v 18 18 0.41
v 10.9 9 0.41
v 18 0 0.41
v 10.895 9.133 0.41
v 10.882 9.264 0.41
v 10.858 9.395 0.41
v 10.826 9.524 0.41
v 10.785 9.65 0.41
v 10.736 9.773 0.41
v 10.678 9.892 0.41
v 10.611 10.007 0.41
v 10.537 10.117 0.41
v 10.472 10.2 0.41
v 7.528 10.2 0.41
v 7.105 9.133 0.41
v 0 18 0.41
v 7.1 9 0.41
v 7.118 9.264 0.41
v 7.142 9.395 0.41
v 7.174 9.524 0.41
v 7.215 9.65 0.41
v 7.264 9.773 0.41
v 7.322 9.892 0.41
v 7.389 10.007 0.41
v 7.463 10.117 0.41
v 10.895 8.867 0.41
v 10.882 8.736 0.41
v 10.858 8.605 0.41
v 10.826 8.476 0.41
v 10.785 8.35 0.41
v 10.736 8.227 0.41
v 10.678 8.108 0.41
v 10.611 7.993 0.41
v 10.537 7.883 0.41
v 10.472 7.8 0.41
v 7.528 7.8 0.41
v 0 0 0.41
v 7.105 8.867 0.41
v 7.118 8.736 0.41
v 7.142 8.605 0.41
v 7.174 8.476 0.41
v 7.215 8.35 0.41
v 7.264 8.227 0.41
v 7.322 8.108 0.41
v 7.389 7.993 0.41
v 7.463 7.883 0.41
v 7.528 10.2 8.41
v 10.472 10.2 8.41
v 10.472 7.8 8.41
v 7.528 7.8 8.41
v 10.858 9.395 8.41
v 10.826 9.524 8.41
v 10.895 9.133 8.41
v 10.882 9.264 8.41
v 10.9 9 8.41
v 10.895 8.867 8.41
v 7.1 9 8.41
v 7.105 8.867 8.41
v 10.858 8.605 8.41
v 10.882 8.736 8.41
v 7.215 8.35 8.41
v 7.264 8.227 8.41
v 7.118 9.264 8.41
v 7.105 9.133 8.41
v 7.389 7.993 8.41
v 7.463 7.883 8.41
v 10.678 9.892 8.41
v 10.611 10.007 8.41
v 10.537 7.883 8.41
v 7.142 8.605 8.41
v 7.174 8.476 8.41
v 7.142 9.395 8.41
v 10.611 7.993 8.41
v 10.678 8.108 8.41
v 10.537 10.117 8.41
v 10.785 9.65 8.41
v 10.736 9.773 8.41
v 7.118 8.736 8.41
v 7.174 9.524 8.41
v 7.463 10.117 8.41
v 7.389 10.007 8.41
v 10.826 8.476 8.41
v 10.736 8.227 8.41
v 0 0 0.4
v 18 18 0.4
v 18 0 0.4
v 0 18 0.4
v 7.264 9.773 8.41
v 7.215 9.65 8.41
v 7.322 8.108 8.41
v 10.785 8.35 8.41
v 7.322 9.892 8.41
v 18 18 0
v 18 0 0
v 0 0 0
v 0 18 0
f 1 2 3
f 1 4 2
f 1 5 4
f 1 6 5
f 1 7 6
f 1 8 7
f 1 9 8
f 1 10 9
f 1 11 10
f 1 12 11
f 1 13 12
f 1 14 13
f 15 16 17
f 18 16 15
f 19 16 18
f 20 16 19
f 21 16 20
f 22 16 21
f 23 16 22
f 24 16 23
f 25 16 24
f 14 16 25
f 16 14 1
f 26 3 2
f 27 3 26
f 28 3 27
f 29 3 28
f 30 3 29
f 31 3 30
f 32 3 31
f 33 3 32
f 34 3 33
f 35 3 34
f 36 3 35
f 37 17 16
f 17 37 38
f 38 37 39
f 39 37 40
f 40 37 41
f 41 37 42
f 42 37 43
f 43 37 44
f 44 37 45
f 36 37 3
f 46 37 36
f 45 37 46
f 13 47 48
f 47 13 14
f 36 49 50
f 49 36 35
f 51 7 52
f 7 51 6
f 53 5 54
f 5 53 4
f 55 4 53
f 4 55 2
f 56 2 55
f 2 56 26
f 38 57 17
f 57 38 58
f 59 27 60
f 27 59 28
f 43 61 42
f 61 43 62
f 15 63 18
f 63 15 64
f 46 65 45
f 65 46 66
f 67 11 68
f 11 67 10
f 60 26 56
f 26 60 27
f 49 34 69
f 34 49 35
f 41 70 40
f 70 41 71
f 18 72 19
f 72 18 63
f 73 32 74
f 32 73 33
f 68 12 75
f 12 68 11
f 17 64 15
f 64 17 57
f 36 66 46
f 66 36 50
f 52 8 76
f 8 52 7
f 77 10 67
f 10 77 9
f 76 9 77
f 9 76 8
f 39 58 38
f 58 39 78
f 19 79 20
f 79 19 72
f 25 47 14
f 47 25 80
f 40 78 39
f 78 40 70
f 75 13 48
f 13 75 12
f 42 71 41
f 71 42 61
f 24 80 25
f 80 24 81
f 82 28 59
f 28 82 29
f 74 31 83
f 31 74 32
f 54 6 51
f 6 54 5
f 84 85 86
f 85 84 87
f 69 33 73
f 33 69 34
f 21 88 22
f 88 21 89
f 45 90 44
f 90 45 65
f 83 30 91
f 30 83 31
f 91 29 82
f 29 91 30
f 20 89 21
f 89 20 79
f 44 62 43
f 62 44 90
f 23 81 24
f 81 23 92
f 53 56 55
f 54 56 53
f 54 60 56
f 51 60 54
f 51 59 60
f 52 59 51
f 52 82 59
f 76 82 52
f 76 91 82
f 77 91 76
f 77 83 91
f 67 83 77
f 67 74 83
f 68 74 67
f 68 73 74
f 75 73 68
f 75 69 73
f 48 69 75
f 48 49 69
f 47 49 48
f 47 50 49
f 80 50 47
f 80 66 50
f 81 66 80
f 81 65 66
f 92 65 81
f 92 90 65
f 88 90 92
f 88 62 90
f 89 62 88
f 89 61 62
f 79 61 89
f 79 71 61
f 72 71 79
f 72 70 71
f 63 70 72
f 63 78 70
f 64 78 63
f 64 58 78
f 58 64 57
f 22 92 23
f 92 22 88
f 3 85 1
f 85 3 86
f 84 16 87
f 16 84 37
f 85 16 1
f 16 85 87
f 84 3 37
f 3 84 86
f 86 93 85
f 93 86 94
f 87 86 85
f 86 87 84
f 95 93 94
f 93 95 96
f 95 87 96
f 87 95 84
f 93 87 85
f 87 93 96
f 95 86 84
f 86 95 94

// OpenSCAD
// file: ../../Base/PlacementOptions.scad
// Fischertechnik Box Foundation
// Placement Options

// Alignment
NoAlign = 0;
AlignLeft = 1;
AlignBottom = 2;
AlignCenter = 3;
AlignRight = 4;
AlignTop = 5;

// Element rotation degree steps
rotations = [0, -90, -180, -270];

// Rotation
NoRotation = 0;
Rotate0 = 0;
Rotate90 = 1;
Rotate180 = 2;
Rotate270 = 3;

// Docking (seen from above)
NoDock = -1;
DockLeft = 0;
DockTop = 1;
DockRight = 2;
DockCorner = 2;
DockBottom = 3;

// Web corners
LowerLeft = 0;
UpperLeft = 1;
UpperRight = 2;
LowerRight = 3;

// Web position relative to corner
LeftOfCorner = 0;
RightOfCorner = 1;

// Rails direction
Horizontal = true;
Vertical = false;
// file: ../../Base/Boxes.scad
// Fischertechnik Box Foundation
// Pre-designed Boxes

use <Constants.scad>

include <PlacementOptions.scad>

box190Width = 190;
box190Depth = 130;
box130Width = 130;
box130Depth = 95;

// Values are from an original ec3 box
topBottomDifference = 1.5;
outerHeight = 40;
baseThickness = 1.8;
innerHeight = outerHeight - baseThickness;
stackExcess = 5.7;
radius = 3.5;
wallThickness = 1.5;
tolerance = 0.2;

boxWallThickness = wallThickness;
boxBaseThickness = baseThickness;
boxWebWidth = 3.0;

// getBoxWallThickness()
// Gets the wall thickness of a Fischertechnik Box
function getBoxWallThickness() = boxWallThickness;

// getBoxUsageHeight(height = 38.2)
// Gets the usable height of a Fischertechnik box
// height = Outer height of the box from the bottom to the upper edge.
function getBoxUsageHeight(height = outerHeight) = height - baseThickness - stackExcess;

// getBoxInnerHeight()
// Gets the inner height of a Fischertechnik box, including the stack excess
function getBoxInnerHeight() = innerHeight;

// getBoxBaseThickness()
// Gets the thickness of the Fischertechnik box base.
function getBoxBaseThickness() = boxBaseThickness;

// getBoxWebWidth()
// Gets the width of a box web
function getBoxWebWidth() = boxWebWidth;

// getBox190Space()
// Gets the usable inner space of a Box 190 as an x/y-list
function getBox190Space() = [
    box190Width - 2*getBoxWallThickness() - topBottomDifference, 
    box190Depth - 2*getBoxWallThickness() - topBottomDifference ];

// RoundedCornerPlate(width, depth, height, radius)
// Creates a body plate with rounded corners for a box. Used
// also to create the complete box with the hull module.
// width = Width of the plate
// depth = depth of the plate 
// height = thickness of the plate
// radius = radius of the rounded corner
module RoundedCornerPlate(width, depth, height, radius) {
    translate([radius, radius])
    hull() {
        w = width-2*radius;
        d = depth-2*radius;
        cube([w, d, height]);
        cylinder(height, r=radius, $fn=getFragments());
        translate([w, 0])
            cylinder(height, r=radius, $fn=getFragments());
        translate([w, d])
            cylinder(height, r=radius, $fn=getFragments());
        translate([0, d])
            cylinder(height, r=radius, $fn=getFragments());
    }
}

// BoxBase(width, depth)
// Creates an empty stackable Fischertechnik compatible box
// width = Outer width of the box (190, 130, ...)
// depth = Outer depth of the box (130, 95, ...)

module BoxBase(width, depth, height=outerHeight) {    
    thinPlate = 0.01;

    innerHeight = height - baseThickness;    
    
    module Body(tolerance=tolerance) {
        hull() {
            // Bottom with tolerance to fit into the original boxes when stacked
            translate([-wallThickness+tolerance, -wallThickness+tolerance, -baseThickness])
                RoundedCornerPlate(width-topBottomDifference-2*tolerance, depth-topBottomDifference-2*tolerance, thinPlate, radius);
            
            // Top
            translate([-wallThickness-topBottomDifference/2, -wallThickness-topBottomDifference/2, innerHeight-thinPlate])
                RoundedCornerPlate(width, depth, thinPlate, radius);
         }
    }

    module Cutoff() {
        hull() {
            coWidth = width - 2*wallThickness;
            coDepth = depth - 2*wallThickness;
            
            // Bottom
            RoundedCornerPlate(coWidth-topBottomDifference, coDepth-topBottomDifference, thinPlate, radius);

            // Top
            translate([-topBottomDifference/2, -topBottomDifference/2, innerHeight+thinPlate]) 
                RoundedCornerPlate(coWidth, coDepth, thinPlate, radius);
        }
    }
    
    difference() {        
        Body();
        Cutoff();
        stackOffset = innerHeight - stackExcess;
        translate([0, 0, stackOffset + baseThickness])
            Body(tolerance=0);
    }
}

// Creates the Fischertechnik empty box 130x190 mm and places it at position 0,0
// 190x130 are the outer sizes, the inner space is slightly smaller. Use getBox190Space() to get the inner sizes.
// The box is positioned that the usable inner space is at the 0,0,0 position.

module Box190() {
    BoxBase(box190Width, box190Depth);
}

// Gets the usable inner space of a Box 130 as an x/y-list
function getBox130Space() = [
    box130Width - 2*getBoxWallThickness() - topBottomDifference, 
    box130Depth - 2*getBoxWallThickness() - topBottomDifference ];

// Creates the Fischertechnik empty box 95x130 mm and places it at position 0,0
// 190x130 are the outer sizes, the inner space is slightly smaller. Use getBox190Space() to get the inner sizes.
// The box is positioned that the usable inner space is at the 0,0,0 position.

module Box130() {
    BoxBase(box130Width, box130Depth);
}

// Creates a web at the specified box walls
// corner 0 = LowerLeft, 1 = UpperLeft, 2 = UpperRight, 3 = LowerRight
// side 0 = LeftOfCorner, 1 = RightOfCorner
// distance = Distance in mm from the corner
// boxSpace = inner width and depth of the box (default: Box 190)
// webWidth = length of the web (default is 3 mms)
// webThickness = thickness of the web (default is 1 mm)
// height = Height of the web (standard is getBoxUsageHeight())
// sink = How much of the web is sunk into the wall

module BoxWeb(
    corner, 
    side, 
    distance, 
    boxSpace=getBox190Space(), 
    webWidth=getBoxWebWidth(), 
    webThickness=1.0, 
    height=getBoxUsageHeight(),
    sink = getBoxWallThickness()/2) {
    width = (corner % 2 == 0) ? 
            (side == LeftOfCorner ? webWidth : webThickness) :
            (side == LeftOfCorner ? webThickness : webWidth);

    depth = (corner % 2 == 0) ? 
            (side == RightOfCorner ? webWidth : webThickness) :
            (side == RightOfCorner ? webThickness : webWidth);
    
    xDiff = corner == LowerLeft ? 
                (side == LeftOfCorner ? -sink : distance) :
            (corner == UpperLeft ?                
                (side == LeftOfCorner ? distance : -sink) :
            (corner == UpperRight ?
                (side == LeftOfCorner ? boxSpace.x-webWidth+sink : boxSpace.x-distance-webThickness) :
                (side == LeftOfCorner ? boxSpace.x-distance-webThickness: boxSpace.x-webWidth+sink)));

    yDiff = corner == LowerLeft ? 
                (side == RightOfCorner ? -sink : distance) :
            (corner == UpperLeft ?
                (side == RightOfCorner ? boxSpace.y-distance-webThickness : boxSpace.y-webWidth+sink) :
            (corner == UpperRight ?
                (side == RightOfCorner ? boxSpace.y-webWidth+sink : boxSpace.y-distance-webThickness) :
                (side == RightOfCorner ? distance : -sink)));
    
    translate([xDiff, yDiff, -getExcess()])
        cube([width, depth, height + 2*getExcess()]);
}
// file: ../../Base/Rotation.scad
// Fischertechnik Box Foundation
// Geometry Helpers Rotation

include <PlacementOptions.scad>

// getRotatedSpace(space, rotation=NoRotation)
// Rotates the space dependent on the specified rotation

function getRotatedSpace(space, rotation=NoRotation) = [
    (rotation == Rotate90 || rotation == Rotate270) ? space.y : space.x,
    (rotation == Rotate90 || rotation == Rotate270) ? space.x : space.y
];

// Rotates the given space around the fixed left lower corner
// space = the space the children needs as width/depth list [width,depth]
// rotation = 0 Rotate0 degrees, 1 Rotate90 degrees, 2 Rotate180 degrees, 3 Rotate270 degrees (equivalent to -90)

module RotateFix(space, rotation=NoRotation) {
    dy = (rotation == Rotate0 || rotation == Rotate270) ? 0 :
        (rotation == Rotate90) ? space.x :
        space.y;
    dx = (rotation < Rotate180) ? 0 :
        (rotation == Rotate180) ? space.x :
        space.y;
    
    translate([dx, dy, 0])
        rotate([0, 0, rotations[rotation]])
            children();
}
// file: ../../Base/Alignment.scad
// Fischertechnik Box Foundation
// Geometry Helpers Alignment

include <PlacementOptions.scad>

// getAlignedX(elementWidth, spaceWidth, align=AlignRight, offset=0)
// Gets the aligned X offset of an element with the given
// width in the given space.
// elementWidth = The width of the element to positon
// spaceWidth = The space where the element should be aligned
// align = 0 AlignLeft, 1 AlignCenter, 2 AlignRight
// offset = an optional offset from the aligned position. When
// aligned left or centered, then positive values are in X direction.
// When aligned right then positive values are in negative X direction.

function getAlignedX(elementWidth, spaceWidth, align=AlignRight, offset=0) =
    (align == AlignLeft) ?
        offset :
        ((align == AlignCenter) ?
        (spaceWidth - elementWidth)/2 + offset :
        spaceWidth - offset - elementWidth);

// getAlignedY(elementDepth, spaceDepth, align=AlignTop, offset=0)
// Gets the aligned Y offset of an element with the given
// depth in the given space.
// elementDepth = The depth of the element to positon
// spaceDepth = The space where the element should be aligned
// align = 0 AlignBottom, 1 AlignCenter, 2 AlignTop
// offset = an optional offset from the aligned position. When
// aligned bottom or centered, then positive values are in Y direction.
// When aligned top then positive values are in negative Y direction.

function getAlignedY(elementDepth, spaceDepth, align=AlignTop, offset=0) =
    (align == AlignBottom) ?
        offset :
        ((align == AlignCenter) ?
        (spaceDepth - elementDepth)/2 + offset :
        spaceDepth - offset - elementDepth);
// file: ../../Base/Placement.scad
// Fischertechnik Box Foundation
// Geometry Helpers Placement

use <Constants.scad>
use <Alignment.scad>
use <Rotation.scad>
use <Boxes.scad>

include <PlacementOptions.scad>

// Place(x=0, y=0, elementSpace=[0,0], alignX=AlignLeft, alignY=AlignBottom, rotation=Rotate0, boxSpace=getBox190Space())
// Places the child at the specified position
// y = Y-Position. This is a relative position when an X aligment is specified.
// x = X-Position. This is a relative position when an Y aligment is specified.
// elementSpace = space of the element to be placed [x,y]
// alignX = -1=NoAlign, 0 AlignLeft, 1 AlignCenter, 3 AlignRight (elementSpace and boxSpace required!)
// alignY = -1=NoAlign, 2 AlignBottom, 1 AlignCenter, 4 AlignTop (elementSpace and boxSpace required!)
// rotation = 0 Rotate0 0 degrees, 1 Rotate90 90 degrees, 
// 2 Rotate180 180 degrees, 3 Rotate270 270 degrees (equivalent to -90)
// boxSpace = Inner space of the box where the placement occurs [x,y] - default is Box 190x130 inner space

module Place(x=0, y=0, elementSpace=[0,0], 
  alignX=AlignLeft, alignY=AlignBottom, 
  rotation=NoRotation, boxSpace=getBox190Space()) {

    module Position(x, y, space, rotation=Rotate0) {
        translate([x, y, 0])
            RotateFix(space, rotation)
                children();
    }

    space = getRotatedSpace(elementSpace, rotation);
    alignedX = getAlignedX(space.x, boxSpace.x, alignX, x);
    alignedY = getAlignedY(space.y, boxSpace.y, alignY, y);
    Position(alignedX, alignedY, elementSpace, rotation)
        children();
}

// Center(space=getBox130Space(), elementSpace=[0,0])
// space = Space where the children is centered. For cylinder use centered=true and no elementSpace.
// elementSpace = space of the element to be centered [x,y]

module Center(space=getBox190Space(), elementSpace=[0,0]) {
    Place(elementSpace=elementSpace, boxSpace=space, alignX=AlignCenter, alignY=AlignCenter)
        children();
}

// CenterHorizontal(width=0, y=0, offset=0, space=getBox130Space())
// width = Width of the element to be placed.
// y = Y position of the element
// offset = Offset from the center position (negative will be left of the center)
// space = Space where the element is placed

module CenterHorizontal(width=0, y=0, offset=0, space=getBox190Space()) {
    Place(x=offset, y=y, elementSpace=[width, 0], boxSpace=space, alignX=AlignCenter)
        children(0);
}

// CenterVertical(depth=0, x=0, offset=0, space=getBox130Space())
// depth = Depth of the element to be placed.
// x = X position of the element
// offset = Offset from the center position (negative will be down of the center)
// space = Space where the element is placed

module CenterVertical(depth=0, x=0, offset=0, space=getBox190Space()) {
    Place(x=x, y=offset, elementSpace=[0, depth], boxSpace=space, alignY=AlignCenter)
        children(0);
}

// getIsVertical(align)
// True if the specified alignment needs a vertical orientation for a divider (AlignRight, AlignLeft)

function getIsVertical(align) = (align == AlignRight || align == AlignLeft);

// getIsHorizontal(align)
// True if the specified alignment needs a horizontal orientation for a divider (AlignTop, AlignBottom)

function getIsHorizontal(align) = (align == AlignTop || align == AlignBottom);
// file: ../../Elements/AxisClip10.scad
// Fischertechnik Box Library
// Axis for clip 10
// 31023

use <../ModelBase/Simple.scad>
use <../Base/Constants.scad>

/* [Element Parameters] */
height = 23;
clipHeight = 10;

/* [Hidden] */
width = 12;
depth = 12;
upperDiameter = 3.6;

// getAxisClip10Space()
// Gets the space of a n axis for a clip 10 with spring ring (mot2)

function getAxisClip10Space() = [width, depth, height];

// AxisClip10(height, clipHeight)
// Axis for clip 10 with spring ring (mot2)
// height = Height of the complete axis (standard is 23, in mot3 its only 12)
// clipHeight = Height of the part for the clip (standard is 10, in mot3 its only 7)

module AxisClip10(height=height, clipHeight=clipHeight) {
    LeveledAxisWithSpace(height, height-clipHeight, getAxisClip10Space(), diameter=upperDiameter);
}

// Test
color("lightgray")
AxisClip10(height, clipHeight);
// file: ../../Base/Constants.scad
// Fischertechnik Box Foundation
// Constants

// Constant values necessary for multiple elements

// Base constants
dividerThickness = 1.2;
excess = 0.01;
fragments = 90;
tolerance = 0.8;

// Gets the thickness of a divider 
function getDividerThickness() = dividerThickness;

// Gets the excess that is used to merge walls into each other
function getExcess() = excess;

// Gets amount of fragments of a cylinder
function getFragments() = fragments;

// Gets the inner tolerance of a frame to each side
function getTolerance() = tolerance;


// Fischertechnik specific constants
axisDiameter = 4;
axisBottomDiameter = axisDiameter + 1;
axisTolerance = 0.2;
axisLockingLength = 8;

// Gets axis diameter of Fischertechnik axis
function getAxisDiameter() = axisDiameter;

// Gets axis diameter tolerance (subtracted for element axis)
function getAxisTolerance() = axisTolerance;

// Gets the axis diameter for standing axis
function getStandAxisDiameter() = getAxisDiameter() - getAxisTolerance();

// Gets axis bottom diameter for thicker part at the bottom
function getAxisBottomDiameter() = axisBottomDiameter;

// Gets the lengthh of the locking part of a locking axis
function getAxisLockingLength() = axisLockingLength;

pinHeight = 2.5;
pinTolerance = 0.2;

// gets the height of a connecting pin
function getPinHeight() = pinHeight;

// gets the connecting pin height tolerance
function getPinTolerance() = pinTolerance;

standardEdgeDistance = 2.5;
standardWebDistance = 11.5;
standardCornerLength = 15;

// gets the standard distance to the wall of the box for dockable frames with webs
function getStandardEdgeDistance() = standardEdgeDistance;

// gets the standard distance of each web to the corner of the dockable frame
function getStandardWebDistance() = standardWebDistance;

// gets the standard length of the corner walls of a dockable frame
function getStandardCornerLength() = standardCornerLength;

tubeWallFactor = 0.8;

// gets the wall thickness of a tube.
function getTubeWallThickness() = tubeWallFactor * getDividerThickness();

smallPartsFrameHeight = 20;

// gets the frame height for docked small parts boxes.
function getSmallPartsFrameHeight() = smallPartsFrameHeight;

hubRingDiameter = 19.5;
hubRingLevelDiameter = 21;

// gets the diameter of a tube matching the inner ring of a wheel
function getHubRingDiameter() = hubRingDiameter;

// gets the diameter of a hub tube with a thicker diameter
function getHubRingLevelDiameter() = hubRingLevelDiameter;
// file: ../../Elements/AxisLockingGear10.scad
// Fischertechnik Box Library
// Axis for Locking Gear 10
// 35945

use <../Base/Placement.scad>
use <../ModelBase/Simple.scad>

/* [Hidden] */
width = 18;
depth = 18;

// getAxisLockingGear10Space()
// Gets the space the locking gear 10 needs

function getAxisLockingGear10Space() = [width, depth];

// AxisLockingGear10()
// Standing locking axis for locking gear 10.

module AxisLockingGear10() {
    space = [width, depth];
    Space(space);
    Center(space)
        LockingAxis();
}

// Tests
color("lightgray")
AxisLockingGear10();
// file: ../TestPrint.scad
// 3D Print Test Base

use <../Base/Constants.scad>

use <../Elements/AxisClip10.scad>

module TestPrint(elementSpace) {
    cube([elementSpace.x, elementSpace.y, 0.4]);
    translate([0,0,0.4+getExcess()]) {
        children();
    }
}

TestPrint(getAxisClip10Space())
    AxisClip10();
// main file
// 3D Print Test
// AxisLockingGear10

use <../TestPrint.scad>
use <../../Elements/AxisLockingGear10.scad>

TestPrint(getAxisLockingGear10Space())
    AxisLockingGear10();
